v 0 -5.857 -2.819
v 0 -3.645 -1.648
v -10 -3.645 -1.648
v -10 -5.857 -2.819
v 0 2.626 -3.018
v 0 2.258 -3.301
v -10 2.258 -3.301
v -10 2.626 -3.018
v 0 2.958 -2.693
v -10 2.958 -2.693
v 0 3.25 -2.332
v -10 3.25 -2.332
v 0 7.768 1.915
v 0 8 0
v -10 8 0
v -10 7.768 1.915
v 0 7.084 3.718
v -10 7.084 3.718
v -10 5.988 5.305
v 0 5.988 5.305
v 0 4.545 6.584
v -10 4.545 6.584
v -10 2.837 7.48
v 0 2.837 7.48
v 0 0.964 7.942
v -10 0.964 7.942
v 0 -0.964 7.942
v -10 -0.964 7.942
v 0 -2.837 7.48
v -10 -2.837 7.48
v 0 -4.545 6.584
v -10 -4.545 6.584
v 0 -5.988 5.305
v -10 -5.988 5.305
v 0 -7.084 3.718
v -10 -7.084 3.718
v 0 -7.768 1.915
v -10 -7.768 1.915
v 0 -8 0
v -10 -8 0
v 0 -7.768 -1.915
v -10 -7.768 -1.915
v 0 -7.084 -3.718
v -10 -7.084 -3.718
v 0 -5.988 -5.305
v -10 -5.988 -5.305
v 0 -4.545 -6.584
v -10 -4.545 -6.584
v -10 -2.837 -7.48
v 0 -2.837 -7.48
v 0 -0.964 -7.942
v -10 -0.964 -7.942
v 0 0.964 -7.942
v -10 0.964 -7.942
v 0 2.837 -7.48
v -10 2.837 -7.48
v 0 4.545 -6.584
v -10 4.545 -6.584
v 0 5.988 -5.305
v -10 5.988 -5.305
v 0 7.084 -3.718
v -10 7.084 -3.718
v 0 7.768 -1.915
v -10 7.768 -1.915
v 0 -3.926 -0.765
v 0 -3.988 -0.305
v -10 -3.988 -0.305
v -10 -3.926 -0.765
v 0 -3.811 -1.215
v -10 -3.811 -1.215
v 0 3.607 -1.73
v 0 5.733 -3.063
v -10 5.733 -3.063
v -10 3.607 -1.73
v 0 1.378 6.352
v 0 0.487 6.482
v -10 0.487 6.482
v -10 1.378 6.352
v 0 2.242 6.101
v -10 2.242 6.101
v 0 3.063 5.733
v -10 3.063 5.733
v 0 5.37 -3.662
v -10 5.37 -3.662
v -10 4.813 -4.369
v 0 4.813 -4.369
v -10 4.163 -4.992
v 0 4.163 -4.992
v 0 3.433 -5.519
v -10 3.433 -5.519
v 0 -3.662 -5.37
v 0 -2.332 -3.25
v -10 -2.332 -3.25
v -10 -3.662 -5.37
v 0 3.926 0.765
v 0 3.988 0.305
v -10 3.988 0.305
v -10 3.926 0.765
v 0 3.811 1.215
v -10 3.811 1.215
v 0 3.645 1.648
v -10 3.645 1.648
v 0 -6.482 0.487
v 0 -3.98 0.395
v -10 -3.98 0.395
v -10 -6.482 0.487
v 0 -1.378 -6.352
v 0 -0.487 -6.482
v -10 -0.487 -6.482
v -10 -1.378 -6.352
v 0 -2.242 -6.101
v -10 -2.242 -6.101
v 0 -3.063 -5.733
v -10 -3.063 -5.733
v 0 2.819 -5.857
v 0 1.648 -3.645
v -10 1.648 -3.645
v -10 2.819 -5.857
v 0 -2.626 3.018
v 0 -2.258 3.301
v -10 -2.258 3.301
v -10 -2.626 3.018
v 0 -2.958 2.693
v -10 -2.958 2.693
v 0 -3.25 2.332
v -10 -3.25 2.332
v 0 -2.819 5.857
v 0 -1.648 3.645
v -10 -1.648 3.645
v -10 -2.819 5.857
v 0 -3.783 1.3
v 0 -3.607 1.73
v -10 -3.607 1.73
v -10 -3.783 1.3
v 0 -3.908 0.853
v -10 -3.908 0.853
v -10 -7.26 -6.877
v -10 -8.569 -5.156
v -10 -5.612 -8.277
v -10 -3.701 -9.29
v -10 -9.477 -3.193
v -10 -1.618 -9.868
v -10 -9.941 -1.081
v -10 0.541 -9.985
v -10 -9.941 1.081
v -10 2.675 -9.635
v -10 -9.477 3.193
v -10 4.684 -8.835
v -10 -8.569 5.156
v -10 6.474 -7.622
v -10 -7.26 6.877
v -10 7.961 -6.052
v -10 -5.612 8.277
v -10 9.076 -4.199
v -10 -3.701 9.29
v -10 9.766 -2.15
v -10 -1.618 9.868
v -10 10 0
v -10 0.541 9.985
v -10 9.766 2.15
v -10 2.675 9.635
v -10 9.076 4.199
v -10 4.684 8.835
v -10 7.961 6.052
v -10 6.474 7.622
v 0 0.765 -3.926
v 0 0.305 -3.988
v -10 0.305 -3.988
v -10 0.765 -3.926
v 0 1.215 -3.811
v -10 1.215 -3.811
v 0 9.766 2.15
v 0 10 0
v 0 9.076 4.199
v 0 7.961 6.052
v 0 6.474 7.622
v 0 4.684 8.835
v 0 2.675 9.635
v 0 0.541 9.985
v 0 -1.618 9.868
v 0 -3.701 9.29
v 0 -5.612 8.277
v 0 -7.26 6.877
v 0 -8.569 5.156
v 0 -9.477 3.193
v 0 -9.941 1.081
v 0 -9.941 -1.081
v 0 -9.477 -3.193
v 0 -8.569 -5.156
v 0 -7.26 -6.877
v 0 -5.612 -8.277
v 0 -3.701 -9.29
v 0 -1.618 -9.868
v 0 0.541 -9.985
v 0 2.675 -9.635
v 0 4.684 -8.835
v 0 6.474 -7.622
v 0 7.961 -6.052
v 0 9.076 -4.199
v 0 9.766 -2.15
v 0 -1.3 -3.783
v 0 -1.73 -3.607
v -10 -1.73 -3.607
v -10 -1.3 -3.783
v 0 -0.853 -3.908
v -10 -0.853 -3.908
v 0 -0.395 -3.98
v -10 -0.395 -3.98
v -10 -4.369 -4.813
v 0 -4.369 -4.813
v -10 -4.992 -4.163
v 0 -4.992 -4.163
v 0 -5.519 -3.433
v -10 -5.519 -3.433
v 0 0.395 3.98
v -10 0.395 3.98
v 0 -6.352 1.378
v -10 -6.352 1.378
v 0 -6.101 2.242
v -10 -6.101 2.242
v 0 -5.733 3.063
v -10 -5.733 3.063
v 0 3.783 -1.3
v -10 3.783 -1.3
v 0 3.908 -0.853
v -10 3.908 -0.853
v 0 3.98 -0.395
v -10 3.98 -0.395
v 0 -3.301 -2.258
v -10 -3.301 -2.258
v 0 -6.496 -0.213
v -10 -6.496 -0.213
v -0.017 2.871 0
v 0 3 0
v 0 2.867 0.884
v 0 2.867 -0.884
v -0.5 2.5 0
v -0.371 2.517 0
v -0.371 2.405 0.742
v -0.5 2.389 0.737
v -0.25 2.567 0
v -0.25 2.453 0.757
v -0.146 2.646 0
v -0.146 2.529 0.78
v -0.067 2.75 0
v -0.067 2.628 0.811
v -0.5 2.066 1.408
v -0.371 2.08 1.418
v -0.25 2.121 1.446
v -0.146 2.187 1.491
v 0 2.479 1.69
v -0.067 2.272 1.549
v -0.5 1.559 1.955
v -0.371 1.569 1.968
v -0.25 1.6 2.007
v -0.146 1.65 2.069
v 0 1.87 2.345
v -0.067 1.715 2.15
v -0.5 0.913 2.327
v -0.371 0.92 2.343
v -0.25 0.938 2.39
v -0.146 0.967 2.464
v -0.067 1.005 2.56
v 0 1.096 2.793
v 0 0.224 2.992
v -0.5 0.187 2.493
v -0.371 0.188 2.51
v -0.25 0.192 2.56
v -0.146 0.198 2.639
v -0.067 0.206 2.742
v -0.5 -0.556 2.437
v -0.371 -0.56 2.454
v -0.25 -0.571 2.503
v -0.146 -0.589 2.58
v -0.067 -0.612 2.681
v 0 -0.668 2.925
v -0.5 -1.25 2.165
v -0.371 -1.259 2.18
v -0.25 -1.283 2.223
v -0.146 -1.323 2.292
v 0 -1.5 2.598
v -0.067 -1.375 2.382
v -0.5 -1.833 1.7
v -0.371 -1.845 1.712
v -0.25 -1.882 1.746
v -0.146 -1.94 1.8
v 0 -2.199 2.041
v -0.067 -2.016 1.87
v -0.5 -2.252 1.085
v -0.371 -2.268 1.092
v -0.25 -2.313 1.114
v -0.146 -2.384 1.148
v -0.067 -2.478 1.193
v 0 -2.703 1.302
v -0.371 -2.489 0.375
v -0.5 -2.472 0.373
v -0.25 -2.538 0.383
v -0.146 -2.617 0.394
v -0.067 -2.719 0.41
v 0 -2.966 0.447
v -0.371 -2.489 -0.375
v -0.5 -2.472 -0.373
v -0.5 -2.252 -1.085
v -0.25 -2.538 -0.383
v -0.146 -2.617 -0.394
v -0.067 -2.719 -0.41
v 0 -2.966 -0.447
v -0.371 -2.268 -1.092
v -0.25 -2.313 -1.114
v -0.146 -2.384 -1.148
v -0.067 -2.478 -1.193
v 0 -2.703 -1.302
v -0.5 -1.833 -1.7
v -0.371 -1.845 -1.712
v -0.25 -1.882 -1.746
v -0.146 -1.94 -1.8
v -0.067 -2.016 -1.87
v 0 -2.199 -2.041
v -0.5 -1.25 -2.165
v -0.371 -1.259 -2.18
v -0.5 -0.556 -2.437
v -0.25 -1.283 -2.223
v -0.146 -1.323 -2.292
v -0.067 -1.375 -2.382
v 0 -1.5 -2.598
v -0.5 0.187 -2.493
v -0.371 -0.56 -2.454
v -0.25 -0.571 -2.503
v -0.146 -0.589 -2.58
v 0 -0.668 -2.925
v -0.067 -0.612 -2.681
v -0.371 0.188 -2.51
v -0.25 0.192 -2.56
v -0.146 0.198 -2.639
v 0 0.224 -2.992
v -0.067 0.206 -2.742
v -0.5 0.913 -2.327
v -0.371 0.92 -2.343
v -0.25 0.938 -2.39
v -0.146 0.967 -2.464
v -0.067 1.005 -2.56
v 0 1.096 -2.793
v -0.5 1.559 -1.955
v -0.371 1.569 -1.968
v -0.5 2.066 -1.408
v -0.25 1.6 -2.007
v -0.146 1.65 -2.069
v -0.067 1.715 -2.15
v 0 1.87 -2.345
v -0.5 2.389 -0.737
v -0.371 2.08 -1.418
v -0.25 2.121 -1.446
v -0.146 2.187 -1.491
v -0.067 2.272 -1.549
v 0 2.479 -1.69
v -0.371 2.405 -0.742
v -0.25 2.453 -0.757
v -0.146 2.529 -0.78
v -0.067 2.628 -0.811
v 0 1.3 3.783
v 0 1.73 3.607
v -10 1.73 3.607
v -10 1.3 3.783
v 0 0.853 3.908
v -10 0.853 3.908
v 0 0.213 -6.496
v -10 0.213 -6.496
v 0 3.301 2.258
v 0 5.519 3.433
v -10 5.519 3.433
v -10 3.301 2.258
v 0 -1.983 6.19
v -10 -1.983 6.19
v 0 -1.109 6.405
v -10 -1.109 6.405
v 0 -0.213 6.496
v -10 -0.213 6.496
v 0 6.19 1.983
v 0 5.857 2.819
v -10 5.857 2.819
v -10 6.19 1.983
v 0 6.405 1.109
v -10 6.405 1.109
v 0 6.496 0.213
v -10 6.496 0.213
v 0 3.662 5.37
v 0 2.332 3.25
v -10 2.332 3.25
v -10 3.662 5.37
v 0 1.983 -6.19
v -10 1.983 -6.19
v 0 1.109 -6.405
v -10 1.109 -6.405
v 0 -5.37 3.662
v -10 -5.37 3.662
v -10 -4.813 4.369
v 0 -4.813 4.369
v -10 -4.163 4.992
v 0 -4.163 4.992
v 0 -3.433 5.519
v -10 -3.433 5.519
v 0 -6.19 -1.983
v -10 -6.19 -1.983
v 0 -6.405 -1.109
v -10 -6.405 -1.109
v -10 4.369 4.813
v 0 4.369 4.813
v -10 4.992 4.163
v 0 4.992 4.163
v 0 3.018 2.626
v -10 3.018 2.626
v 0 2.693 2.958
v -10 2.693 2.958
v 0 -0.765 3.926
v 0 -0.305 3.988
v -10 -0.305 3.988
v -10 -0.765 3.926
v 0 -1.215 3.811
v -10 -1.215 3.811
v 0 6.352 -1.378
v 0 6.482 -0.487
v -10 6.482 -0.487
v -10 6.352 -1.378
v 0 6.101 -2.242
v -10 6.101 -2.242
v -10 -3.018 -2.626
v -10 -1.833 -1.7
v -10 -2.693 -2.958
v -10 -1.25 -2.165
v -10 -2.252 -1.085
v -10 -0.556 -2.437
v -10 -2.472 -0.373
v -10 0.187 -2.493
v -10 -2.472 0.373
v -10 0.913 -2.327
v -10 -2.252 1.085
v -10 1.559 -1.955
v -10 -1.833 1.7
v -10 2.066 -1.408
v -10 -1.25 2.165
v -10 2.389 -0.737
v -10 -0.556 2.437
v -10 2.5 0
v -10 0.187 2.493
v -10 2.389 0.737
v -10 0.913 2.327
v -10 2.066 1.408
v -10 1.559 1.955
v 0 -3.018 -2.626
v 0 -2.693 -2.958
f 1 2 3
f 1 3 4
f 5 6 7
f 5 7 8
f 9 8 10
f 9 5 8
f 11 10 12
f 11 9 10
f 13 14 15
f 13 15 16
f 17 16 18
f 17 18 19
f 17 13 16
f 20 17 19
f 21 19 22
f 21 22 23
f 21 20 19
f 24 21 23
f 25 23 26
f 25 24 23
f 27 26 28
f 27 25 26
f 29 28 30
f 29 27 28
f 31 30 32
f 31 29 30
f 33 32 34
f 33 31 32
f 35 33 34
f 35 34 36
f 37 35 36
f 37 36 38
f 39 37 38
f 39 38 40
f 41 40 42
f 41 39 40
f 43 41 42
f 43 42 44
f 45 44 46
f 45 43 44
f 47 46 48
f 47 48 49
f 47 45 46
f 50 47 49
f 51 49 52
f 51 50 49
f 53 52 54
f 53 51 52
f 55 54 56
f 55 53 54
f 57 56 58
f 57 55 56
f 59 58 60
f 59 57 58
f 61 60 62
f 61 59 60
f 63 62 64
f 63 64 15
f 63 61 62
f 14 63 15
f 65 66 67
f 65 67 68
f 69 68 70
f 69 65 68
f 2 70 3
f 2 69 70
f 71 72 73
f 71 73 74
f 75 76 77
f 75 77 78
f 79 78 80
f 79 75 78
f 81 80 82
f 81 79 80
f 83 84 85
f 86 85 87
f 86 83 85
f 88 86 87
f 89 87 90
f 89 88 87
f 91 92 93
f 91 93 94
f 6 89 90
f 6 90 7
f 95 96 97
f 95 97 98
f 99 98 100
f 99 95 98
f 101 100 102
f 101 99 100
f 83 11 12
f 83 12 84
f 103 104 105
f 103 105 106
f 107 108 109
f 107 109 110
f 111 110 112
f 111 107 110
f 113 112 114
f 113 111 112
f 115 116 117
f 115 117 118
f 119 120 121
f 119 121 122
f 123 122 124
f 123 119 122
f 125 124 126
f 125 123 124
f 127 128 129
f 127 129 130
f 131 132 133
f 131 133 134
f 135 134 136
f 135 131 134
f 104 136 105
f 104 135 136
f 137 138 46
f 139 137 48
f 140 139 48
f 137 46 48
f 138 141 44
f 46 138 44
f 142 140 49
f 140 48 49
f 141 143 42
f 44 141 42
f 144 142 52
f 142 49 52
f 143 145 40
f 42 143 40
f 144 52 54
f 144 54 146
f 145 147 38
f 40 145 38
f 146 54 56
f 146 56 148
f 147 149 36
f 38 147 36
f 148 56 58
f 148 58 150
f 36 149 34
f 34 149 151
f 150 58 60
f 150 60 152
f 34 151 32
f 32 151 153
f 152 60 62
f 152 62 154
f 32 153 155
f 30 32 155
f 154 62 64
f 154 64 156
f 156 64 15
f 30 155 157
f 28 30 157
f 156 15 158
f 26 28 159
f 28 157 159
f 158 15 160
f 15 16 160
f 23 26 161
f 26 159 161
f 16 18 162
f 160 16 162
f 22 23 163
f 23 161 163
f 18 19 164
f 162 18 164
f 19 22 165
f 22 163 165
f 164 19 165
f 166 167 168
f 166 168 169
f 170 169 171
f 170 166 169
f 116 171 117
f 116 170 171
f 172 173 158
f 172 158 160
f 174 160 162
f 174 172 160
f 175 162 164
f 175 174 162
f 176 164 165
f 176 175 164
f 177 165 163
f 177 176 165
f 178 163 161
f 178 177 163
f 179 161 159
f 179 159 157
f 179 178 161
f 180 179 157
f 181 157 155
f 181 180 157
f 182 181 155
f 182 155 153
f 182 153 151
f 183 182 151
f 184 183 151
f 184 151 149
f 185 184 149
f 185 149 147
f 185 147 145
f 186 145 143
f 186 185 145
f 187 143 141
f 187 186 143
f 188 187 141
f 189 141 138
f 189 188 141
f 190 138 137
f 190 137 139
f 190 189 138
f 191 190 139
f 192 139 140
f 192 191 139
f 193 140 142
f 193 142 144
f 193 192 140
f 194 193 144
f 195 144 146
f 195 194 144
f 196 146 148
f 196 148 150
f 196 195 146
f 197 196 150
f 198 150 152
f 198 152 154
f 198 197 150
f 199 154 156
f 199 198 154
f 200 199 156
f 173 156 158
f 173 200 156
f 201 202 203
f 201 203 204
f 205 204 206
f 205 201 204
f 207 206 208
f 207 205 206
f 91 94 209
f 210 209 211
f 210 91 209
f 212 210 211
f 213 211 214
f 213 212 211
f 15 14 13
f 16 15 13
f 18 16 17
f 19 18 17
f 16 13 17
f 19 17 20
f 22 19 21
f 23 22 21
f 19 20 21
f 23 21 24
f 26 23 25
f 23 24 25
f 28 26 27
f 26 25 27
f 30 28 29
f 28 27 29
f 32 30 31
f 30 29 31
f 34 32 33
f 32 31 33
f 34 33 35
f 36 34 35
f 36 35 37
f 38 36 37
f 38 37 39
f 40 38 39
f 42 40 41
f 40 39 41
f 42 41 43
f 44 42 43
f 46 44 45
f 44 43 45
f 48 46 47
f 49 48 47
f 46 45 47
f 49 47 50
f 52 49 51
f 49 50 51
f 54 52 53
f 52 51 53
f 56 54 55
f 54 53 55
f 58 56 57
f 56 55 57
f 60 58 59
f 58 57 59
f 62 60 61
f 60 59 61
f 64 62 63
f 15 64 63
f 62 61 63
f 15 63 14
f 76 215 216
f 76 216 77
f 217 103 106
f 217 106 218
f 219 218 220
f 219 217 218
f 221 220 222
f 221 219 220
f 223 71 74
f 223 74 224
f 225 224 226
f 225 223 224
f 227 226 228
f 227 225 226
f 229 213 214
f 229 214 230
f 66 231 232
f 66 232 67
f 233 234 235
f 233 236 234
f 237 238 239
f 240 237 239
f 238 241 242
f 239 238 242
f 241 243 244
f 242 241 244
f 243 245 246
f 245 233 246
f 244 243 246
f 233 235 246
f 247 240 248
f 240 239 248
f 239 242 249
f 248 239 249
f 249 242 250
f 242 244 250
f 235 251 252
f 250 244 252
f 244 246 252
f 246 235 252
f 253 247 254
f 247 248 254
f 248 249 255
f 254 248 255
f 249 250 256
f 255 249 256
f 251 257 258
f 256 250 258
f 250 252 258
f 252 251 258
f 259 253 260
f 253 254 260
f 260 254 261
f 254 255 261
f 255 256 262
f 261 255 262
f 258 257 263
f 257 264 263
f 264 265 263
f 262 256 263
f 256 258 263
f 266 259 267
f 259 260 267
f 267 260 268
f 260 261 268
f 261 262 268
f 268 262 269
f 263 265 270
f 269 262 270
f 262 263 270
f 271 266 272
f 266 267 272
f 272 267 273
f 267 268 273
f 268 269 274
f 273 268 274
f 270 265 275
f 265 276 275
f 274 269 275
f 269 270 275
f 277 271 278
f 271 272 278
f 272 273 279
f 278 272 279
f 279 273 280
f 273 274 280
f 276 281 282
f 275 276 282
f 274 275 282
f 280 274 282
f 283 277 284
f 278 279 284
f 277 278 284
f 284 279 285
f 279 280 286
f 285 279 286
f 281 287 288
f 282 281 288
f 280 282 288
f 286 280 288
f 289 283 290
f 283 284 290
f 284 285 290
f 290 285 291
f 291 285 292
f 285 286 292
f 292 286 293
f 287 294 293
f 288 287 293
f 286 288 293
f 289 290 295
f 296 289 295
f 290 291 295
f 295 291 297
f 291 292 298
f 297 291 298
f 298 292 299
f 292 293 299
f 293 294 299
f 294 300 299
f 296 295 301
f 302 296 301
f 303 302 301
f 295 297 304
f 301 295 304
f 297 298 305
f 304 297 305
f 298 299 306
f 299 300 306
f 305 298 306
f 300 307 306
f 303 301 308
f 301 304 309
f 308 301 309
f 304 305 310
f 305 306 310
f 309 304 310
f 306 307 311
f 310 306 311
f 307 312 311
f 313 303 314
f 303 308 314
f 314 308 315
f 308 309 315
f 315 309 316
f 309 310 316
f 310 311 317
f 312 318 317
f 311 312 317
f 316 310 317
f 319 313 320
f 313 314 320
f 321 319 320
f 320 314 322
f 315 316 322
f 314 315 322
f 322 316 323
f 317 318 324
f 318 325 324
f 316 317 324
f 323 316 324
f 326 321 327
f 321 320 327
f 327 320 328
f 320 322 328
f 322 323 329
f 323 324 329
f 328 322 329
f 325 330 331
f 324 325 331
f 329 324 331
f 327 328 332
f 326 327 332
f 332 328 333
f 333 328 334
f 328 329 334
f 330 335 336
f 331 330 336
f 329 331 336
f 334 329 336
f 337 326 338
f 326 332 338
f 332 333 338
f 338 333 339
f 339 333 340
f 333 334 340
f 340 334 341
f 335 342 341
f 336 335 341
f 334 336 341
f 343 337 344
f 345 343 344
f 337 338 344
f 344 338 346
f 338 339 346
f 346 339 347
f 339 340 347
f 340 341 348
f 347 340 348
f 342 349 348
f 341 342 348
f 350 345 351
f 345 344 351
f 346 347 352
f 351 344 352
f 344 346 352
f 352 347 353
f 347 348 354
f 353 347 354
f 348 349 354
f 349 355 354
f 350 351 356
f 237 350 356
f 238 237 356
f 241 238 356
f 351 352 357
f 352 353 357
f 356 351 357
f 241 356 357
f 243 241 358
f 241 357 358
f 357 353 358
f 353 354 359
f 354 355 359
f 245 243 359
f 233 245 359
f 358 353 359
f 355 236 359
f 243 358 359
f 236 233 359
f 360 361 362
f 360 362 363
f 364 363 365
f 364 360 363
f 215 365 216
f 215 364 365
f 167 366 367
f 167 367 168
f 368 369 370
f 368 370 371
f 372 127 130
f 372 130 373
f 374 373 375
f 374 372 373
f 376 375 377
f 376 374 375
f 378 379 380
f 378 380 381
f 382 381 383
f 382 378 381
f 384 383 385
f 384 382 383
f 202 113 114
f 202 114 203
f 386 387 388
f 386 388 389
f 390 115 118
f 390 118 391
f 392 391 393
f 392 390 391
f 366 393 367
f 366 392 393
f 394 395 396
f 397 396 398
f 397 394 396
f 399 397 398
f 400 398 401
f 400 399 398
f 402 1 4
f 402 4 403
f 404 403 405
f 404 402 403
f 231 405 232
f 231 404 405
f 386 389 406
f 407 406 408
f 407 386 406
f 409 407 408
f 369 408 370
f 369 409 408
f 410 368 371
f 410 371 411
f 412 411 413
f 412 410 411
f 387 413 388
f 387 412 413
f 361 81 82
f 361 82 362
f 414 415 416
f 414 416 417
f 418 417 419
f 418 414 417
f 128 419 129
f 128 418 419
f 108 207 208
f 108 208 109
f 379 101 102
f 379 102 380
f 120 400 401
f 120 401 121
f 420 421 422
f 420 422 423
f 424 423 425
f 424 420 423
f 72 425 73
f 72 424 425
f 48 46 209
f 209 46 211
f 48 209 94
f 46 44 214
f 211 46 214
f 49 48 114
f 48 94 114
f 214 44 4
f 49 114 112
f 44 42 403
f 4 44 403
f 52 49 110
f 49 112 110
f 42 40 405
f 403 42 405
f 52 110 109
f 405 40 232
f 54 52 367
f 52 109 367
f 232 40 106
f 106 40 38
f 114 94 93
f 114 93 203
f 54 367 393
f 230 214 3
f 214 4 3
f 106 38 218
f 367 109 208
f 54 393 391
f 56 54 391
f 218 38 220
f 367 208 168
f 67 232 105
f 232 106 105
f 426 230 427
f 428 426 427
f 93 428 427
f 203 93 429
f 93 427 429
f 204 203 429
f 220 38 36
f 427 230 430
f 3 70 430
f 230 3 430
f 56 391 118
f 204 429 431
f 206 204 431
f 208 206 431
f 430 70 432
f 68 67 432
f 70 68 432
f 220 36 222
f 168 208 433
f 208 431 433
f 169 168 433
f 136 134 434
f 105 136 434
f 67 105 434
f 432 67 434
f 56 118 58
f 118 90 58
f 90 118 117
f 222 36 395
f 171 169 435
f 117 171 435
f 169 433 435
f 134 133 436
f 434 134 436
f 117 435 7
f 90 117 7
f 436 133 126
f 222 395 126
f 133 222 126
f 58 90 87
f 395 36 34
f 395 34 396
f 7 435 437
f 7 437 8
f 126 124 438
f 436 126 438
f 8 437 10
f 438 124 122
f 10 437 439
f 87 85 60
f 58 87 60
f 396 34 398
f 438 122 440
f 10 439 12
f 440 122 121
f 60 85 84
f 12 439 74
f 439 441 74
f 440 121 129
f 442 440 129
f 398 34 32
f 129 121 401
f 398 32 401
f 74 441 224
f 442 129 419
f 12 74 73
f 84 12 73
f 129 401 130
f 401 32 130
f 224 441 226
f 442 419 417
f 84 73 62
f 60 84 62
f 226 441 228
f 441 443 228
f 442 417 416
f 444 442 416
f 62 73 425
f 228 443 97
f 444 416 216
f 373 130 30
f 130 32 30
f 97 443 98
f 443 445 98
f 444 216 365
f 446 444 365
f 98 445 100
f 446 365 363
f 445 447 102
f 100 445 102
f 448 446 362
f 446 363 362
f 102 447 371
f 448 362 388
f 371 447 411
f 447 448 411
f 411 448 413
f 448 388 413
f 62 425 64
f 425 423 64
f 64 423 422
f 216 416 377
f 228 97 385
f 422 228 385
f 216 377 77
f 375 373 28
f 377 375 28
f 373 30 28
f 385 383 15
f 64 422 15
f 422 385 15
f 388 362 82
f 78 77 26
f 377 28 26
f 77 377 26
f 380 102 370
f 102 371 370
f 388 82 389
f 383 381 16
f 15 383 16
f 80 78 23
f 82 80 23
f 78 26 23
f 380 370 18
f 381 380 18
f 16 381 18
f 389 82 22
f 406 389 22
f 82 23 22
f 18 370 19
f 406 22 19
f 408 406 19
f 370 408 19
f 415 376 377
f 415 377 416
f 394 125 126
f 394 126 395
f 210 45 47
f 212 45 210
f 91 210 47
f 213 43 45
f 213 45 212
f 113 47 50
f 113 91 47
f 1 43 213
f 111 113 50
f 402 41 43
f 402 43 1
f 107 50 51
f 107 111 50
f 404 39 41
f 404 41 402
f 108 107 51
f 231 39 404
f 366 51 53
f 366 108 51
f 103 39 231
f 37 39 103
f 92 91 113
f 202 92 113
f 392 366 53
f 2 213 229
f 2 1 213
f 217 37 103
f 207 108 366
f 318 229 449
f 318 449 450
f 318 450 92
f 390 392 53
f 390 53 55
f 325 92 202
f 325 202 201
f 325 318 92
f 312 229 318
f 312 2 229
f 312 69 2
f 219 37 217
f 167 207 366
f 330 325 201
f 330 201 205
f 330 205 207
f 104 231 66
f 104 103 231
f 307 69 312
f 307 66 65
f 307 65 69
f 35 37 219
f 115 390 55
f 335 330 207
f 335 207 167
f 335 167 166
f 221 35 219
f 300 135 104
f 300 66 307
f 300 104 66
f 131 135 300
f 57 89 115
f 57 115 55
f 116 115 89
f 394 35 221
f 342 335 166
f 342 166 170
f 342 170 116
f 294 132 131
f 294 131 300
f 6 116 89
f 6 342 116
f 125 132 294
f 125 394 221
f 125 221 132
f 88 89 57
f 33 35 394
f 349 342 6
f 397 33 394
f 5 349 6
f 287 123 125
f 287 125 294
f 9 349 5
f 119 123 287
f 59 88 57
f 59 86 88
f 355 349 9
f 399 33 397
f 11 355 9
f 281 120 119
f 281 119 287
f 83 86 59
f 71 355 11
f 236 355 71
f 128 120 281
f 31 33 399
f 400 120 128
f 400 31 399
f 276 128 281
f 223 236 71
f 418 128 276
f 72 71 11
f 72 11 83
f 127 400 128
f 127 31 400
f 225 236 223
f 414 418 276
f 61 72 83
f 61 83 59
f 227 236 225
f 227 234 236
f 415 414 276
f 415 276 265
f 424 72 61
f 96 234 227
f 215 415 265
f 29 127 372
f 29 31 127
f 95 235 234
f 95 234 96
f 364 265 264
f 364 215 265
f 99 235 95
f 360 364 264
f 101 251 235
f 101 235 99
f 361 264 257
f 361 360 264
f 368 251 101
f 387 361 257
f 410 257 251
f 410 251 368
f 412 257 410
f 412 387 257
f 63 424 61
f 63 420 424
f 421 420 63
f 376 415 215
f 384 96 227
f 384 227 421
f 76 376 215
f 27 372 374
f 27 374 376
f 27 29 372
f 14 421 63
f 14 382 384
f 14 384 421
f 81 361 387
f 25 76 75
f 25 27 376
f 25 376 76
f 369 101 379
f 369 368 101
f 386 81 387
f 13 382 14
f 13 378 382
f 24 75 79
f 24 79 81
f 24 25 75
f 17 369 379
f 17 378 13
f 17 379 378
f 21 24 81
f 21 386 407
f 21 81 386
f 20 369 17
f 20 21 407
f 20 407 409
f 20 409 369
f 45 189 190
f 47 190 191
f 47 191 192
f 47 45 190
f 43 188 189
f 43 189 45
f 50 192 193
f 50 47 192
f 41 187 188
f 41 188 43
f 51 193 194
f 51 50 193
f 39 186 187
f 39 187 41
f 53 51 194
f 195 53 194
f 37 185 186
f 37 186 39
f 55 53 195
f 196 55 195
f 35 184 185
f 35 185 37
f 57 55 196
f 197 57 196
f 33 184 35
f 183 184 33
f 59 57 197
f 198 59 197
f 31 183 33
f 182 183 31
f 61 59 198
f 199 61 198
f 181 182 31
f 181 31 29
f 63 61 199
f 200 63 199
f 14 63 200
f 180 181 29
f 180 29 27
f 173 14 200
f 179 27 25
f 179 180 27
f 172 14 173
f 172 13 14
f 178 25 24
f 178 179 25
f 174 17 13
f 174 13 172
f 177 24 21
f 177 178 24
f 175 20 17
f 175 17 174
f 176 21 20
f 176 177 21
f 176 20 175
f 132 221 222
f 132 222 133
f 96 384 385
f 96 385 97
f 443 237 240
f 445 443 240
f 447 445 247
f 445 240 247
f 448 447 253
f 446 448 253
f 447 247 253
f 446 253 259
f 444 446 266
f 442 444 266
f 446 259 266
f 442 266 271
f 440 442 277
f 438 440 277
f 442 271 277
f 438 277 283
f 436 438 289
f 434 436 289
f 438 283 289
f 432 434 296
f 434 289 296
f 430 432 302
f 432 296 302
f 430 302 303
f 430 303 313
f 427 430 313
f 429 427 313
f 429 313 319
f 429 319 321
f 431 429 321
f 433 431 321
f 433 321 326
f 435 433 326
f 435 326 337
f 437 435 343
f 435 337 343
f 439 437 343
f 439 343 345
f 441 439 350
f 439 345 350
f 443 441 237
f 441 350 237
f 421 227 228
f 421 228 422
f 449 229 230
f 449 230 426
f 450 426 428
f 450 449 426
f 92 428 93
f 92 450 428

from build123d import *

# Parameters (mm, degrees)
F0_R     = 10
F0_R_2   = 8
F1_DEPTH = 10
F0_R_3   = 2.5
F2_DEPTH = 10
F3_R     = 0.5


with BuildPart() as f1:
    # F0 (on Right) → F1 (new body)
    with BuildSketch(Plane.YZ):
        Circle(F0_R)
        Circle(F0_R_2, mode=Mode.SUBTRACT)
    extrude(amount=-F1_DEPTH)


with BuildPart() as f2:
    # F0 (on Right) → F2 (new body)
    with BuildSketch(Plane.YZ):
        Circle(F0_R_2)
        with BuildLine():
            ThreePointArc((-0.486581, -6.481762), (-1.814104, -6.241717), (-3.063484, -5.732806))
            Line((-3.063484, -5.732806), (-1.729883, -3.606592))
            ThreePointArc((-1.729883, -3.606592), (-1.078764, -3.851788), (-0.395007, -3.980448))
            Line((-0.395007, -3.980448), (-0.486581, -6.481762))
        make_face(mode=Mode.SUBTRACT)
        with BuildLine():
            ThreePointArc((-5.856661, -2.819489), (-6.312537, -1.549798), (-6.496498, -0.213348))
            Line((-6.496498, -0.213348), (-3.988342, -0.305173))
            ThreePointArc((-3.988342, -0.305173), (-3.875128, -0.991657), (-3.644673, -1.648138))
            Line((-3.644673, -1.648138), (-5.856661, -2.819489))
        make_face(mode=Mode.SUBTRACT)
        with BuildLine():
            ThreePointArc((-3.662273, -5.37008), (-4.691919, -4.498433), (-5.519458, -3.433014))
            Line((-5.519458, -3.433014), (-3.301419, -2.258459))
            ThreePointArc((-3.301419, -2.258459), (-2.860131, -2.796364), (-2.33231, -3.249666))
            Line((-2.33231, -3.249666), (-3.662273, -5.37008))
        make_face(mode=Mode.SUBTRACT)
        with BuildLine():
            ThreePointArc((2.819489, -5.856661), (1.549798, -6.312537), (0.213348, -6.496498))
            Line((0.213348, -6.496498), (0.305173, -3.988342))
            ThreePointArc((0.305173, -3.988342), (0.991657, -3.875128), (1.648138, -3.644673))
            Line((1.648138, -3.644673), (2.819489, -5.856661))
        make_face(mode=Mode.SUBTRACT)
        with BuildLine():
            ThreePointArc((5.37008, -3.662273), (4.498433, -4.691919), (3.433014, -5.519458))
            Line((3.433014, -5.519458), (2.258459, -3.301419))
            ThreePointArc((2.258459, -3.301419), (2.796364, -2.860131), (3.249666, -2.33231))
            Line((3.249666, -2.33231), (5.37008, -3.662273))
        make_face(mode=Mode.SUBTRACT)
        with BuildLine():
            ThreePointArc((6.481762, -0.486581), (6.241717, -1.814104), (5.732806, -3.063484))
            Line((5.732806, -3.063484), (3.606592, -1.729883))
            ThreePointArc((3.606592, -1.729883), (3.851788, -1.078764), (3.980448, -0.395007))
            Line((3.980448, -0.395007), (6.481762, -0.486581))
        make_face(mode=Mode.SUBTRACT)
        with BuildLine():
            ThreePointArc((-6.481762, 0.486581), (-6.241717, 1.814104), (-5.732806, 3.063484))
            Line((-5.732806, 3.063484), (-3.606592, 1.729883))
            ThreePointArc((-3.606592, 1.729883), (-3.851788, 1.078764), (-3.980448, 0.395007))
            Line((-3.980448, 0.395007), (-6.481762, 0.486581))
        make_face(mode=Mode.SUBTRACT)
        with BuildLine():
            ThreePointArc((-5.37008, 3.662273), (-4.498433, 4.691919), (-3.433014, 5.519458))
            Line((-3.433014, 5.519458), (-2.258459, 3.301419))
            ThreePointArc((-2.258459, 3.301419), (-2.796364, 2.860131), (-3.249666, 2.33231))
            Line((-3.249666, 2.33231), (-5.37008, 3.662273))
        make_face(mode=Mode.SUBTRACT)
        with BuildLine():
            ThreePointArc((-2.819489, 5.856661), (-1.549798, 6.312537), (-0.213348, 6.496498))
            Line((-0.213348, 6.496498), (-0.305173, 3.988342))
            ThreePointArc((-0.305173, 3.988342), (-0.991657, 3.875128), (-1.648138, 3.644673))
            Line((-1.648138, 3.644673), (-2.819489, 5.856661))
        make_face(mode=Mode.SUBTRACT)
        Circle(F0_R_3, mode=Mode.SUBTRACT)
        with BuildLine():
            ThreePointArc((3.662273, 5.37008), (4.691919, 4.498433), (5.519458, 3.433014))
            Line((5.519458, 3.433014), (3.301419, 2.258459))
            ThreePointArc((3.301419, 2.258459), (2.860131, 2.796364), (2.33231, 3.249666))
            Line((2.33231, 3.249666), (3.662273, 5.37008))
        make_face(mode=Mode.SUBTRACT)
        with BuildLine():
            ThreePointArc((5.856661, 2.819489), (6.312537, 1.549798), (6.496498, 0.213348))
            Line((6.496498, 0.213348), (3.988342, 0.305173))
            ThreePointArc((3.988342, 0.305173), (3.875128, 0.991657), (3.644673, 1.648138))
            Line((3.644673, 1.648138), (5.856661, 2.819489))
        make_face(mode=Mode.SUBTRACT)
        with BuildLine():
            Line((0.395007, 3.980448), (0.486581, 6.481762))
            ThreePointArc((0.486581, 6.481762), (1.814104, 6.241717), (3.063484, 5.732806))
            Line((3.063484, 5.732806), (1.729883, 3.606592))
            ThreePointArc((1.729883, 3.606592), (1.078764, 3.851788), (0.395007, 3.980448))
        make_face(mode=Mode.SUBTRACT)
    extrude(amount=-F2_DEPTH)

    # F3
    f3_edges = [f2.edges().sort_by_distance(p)[0] for p in [
        (0, -2.5, 0),
    ]]
    fillet(f3_edges, radius=F3_R)


solid = Compound([f1.part, f2.part])
